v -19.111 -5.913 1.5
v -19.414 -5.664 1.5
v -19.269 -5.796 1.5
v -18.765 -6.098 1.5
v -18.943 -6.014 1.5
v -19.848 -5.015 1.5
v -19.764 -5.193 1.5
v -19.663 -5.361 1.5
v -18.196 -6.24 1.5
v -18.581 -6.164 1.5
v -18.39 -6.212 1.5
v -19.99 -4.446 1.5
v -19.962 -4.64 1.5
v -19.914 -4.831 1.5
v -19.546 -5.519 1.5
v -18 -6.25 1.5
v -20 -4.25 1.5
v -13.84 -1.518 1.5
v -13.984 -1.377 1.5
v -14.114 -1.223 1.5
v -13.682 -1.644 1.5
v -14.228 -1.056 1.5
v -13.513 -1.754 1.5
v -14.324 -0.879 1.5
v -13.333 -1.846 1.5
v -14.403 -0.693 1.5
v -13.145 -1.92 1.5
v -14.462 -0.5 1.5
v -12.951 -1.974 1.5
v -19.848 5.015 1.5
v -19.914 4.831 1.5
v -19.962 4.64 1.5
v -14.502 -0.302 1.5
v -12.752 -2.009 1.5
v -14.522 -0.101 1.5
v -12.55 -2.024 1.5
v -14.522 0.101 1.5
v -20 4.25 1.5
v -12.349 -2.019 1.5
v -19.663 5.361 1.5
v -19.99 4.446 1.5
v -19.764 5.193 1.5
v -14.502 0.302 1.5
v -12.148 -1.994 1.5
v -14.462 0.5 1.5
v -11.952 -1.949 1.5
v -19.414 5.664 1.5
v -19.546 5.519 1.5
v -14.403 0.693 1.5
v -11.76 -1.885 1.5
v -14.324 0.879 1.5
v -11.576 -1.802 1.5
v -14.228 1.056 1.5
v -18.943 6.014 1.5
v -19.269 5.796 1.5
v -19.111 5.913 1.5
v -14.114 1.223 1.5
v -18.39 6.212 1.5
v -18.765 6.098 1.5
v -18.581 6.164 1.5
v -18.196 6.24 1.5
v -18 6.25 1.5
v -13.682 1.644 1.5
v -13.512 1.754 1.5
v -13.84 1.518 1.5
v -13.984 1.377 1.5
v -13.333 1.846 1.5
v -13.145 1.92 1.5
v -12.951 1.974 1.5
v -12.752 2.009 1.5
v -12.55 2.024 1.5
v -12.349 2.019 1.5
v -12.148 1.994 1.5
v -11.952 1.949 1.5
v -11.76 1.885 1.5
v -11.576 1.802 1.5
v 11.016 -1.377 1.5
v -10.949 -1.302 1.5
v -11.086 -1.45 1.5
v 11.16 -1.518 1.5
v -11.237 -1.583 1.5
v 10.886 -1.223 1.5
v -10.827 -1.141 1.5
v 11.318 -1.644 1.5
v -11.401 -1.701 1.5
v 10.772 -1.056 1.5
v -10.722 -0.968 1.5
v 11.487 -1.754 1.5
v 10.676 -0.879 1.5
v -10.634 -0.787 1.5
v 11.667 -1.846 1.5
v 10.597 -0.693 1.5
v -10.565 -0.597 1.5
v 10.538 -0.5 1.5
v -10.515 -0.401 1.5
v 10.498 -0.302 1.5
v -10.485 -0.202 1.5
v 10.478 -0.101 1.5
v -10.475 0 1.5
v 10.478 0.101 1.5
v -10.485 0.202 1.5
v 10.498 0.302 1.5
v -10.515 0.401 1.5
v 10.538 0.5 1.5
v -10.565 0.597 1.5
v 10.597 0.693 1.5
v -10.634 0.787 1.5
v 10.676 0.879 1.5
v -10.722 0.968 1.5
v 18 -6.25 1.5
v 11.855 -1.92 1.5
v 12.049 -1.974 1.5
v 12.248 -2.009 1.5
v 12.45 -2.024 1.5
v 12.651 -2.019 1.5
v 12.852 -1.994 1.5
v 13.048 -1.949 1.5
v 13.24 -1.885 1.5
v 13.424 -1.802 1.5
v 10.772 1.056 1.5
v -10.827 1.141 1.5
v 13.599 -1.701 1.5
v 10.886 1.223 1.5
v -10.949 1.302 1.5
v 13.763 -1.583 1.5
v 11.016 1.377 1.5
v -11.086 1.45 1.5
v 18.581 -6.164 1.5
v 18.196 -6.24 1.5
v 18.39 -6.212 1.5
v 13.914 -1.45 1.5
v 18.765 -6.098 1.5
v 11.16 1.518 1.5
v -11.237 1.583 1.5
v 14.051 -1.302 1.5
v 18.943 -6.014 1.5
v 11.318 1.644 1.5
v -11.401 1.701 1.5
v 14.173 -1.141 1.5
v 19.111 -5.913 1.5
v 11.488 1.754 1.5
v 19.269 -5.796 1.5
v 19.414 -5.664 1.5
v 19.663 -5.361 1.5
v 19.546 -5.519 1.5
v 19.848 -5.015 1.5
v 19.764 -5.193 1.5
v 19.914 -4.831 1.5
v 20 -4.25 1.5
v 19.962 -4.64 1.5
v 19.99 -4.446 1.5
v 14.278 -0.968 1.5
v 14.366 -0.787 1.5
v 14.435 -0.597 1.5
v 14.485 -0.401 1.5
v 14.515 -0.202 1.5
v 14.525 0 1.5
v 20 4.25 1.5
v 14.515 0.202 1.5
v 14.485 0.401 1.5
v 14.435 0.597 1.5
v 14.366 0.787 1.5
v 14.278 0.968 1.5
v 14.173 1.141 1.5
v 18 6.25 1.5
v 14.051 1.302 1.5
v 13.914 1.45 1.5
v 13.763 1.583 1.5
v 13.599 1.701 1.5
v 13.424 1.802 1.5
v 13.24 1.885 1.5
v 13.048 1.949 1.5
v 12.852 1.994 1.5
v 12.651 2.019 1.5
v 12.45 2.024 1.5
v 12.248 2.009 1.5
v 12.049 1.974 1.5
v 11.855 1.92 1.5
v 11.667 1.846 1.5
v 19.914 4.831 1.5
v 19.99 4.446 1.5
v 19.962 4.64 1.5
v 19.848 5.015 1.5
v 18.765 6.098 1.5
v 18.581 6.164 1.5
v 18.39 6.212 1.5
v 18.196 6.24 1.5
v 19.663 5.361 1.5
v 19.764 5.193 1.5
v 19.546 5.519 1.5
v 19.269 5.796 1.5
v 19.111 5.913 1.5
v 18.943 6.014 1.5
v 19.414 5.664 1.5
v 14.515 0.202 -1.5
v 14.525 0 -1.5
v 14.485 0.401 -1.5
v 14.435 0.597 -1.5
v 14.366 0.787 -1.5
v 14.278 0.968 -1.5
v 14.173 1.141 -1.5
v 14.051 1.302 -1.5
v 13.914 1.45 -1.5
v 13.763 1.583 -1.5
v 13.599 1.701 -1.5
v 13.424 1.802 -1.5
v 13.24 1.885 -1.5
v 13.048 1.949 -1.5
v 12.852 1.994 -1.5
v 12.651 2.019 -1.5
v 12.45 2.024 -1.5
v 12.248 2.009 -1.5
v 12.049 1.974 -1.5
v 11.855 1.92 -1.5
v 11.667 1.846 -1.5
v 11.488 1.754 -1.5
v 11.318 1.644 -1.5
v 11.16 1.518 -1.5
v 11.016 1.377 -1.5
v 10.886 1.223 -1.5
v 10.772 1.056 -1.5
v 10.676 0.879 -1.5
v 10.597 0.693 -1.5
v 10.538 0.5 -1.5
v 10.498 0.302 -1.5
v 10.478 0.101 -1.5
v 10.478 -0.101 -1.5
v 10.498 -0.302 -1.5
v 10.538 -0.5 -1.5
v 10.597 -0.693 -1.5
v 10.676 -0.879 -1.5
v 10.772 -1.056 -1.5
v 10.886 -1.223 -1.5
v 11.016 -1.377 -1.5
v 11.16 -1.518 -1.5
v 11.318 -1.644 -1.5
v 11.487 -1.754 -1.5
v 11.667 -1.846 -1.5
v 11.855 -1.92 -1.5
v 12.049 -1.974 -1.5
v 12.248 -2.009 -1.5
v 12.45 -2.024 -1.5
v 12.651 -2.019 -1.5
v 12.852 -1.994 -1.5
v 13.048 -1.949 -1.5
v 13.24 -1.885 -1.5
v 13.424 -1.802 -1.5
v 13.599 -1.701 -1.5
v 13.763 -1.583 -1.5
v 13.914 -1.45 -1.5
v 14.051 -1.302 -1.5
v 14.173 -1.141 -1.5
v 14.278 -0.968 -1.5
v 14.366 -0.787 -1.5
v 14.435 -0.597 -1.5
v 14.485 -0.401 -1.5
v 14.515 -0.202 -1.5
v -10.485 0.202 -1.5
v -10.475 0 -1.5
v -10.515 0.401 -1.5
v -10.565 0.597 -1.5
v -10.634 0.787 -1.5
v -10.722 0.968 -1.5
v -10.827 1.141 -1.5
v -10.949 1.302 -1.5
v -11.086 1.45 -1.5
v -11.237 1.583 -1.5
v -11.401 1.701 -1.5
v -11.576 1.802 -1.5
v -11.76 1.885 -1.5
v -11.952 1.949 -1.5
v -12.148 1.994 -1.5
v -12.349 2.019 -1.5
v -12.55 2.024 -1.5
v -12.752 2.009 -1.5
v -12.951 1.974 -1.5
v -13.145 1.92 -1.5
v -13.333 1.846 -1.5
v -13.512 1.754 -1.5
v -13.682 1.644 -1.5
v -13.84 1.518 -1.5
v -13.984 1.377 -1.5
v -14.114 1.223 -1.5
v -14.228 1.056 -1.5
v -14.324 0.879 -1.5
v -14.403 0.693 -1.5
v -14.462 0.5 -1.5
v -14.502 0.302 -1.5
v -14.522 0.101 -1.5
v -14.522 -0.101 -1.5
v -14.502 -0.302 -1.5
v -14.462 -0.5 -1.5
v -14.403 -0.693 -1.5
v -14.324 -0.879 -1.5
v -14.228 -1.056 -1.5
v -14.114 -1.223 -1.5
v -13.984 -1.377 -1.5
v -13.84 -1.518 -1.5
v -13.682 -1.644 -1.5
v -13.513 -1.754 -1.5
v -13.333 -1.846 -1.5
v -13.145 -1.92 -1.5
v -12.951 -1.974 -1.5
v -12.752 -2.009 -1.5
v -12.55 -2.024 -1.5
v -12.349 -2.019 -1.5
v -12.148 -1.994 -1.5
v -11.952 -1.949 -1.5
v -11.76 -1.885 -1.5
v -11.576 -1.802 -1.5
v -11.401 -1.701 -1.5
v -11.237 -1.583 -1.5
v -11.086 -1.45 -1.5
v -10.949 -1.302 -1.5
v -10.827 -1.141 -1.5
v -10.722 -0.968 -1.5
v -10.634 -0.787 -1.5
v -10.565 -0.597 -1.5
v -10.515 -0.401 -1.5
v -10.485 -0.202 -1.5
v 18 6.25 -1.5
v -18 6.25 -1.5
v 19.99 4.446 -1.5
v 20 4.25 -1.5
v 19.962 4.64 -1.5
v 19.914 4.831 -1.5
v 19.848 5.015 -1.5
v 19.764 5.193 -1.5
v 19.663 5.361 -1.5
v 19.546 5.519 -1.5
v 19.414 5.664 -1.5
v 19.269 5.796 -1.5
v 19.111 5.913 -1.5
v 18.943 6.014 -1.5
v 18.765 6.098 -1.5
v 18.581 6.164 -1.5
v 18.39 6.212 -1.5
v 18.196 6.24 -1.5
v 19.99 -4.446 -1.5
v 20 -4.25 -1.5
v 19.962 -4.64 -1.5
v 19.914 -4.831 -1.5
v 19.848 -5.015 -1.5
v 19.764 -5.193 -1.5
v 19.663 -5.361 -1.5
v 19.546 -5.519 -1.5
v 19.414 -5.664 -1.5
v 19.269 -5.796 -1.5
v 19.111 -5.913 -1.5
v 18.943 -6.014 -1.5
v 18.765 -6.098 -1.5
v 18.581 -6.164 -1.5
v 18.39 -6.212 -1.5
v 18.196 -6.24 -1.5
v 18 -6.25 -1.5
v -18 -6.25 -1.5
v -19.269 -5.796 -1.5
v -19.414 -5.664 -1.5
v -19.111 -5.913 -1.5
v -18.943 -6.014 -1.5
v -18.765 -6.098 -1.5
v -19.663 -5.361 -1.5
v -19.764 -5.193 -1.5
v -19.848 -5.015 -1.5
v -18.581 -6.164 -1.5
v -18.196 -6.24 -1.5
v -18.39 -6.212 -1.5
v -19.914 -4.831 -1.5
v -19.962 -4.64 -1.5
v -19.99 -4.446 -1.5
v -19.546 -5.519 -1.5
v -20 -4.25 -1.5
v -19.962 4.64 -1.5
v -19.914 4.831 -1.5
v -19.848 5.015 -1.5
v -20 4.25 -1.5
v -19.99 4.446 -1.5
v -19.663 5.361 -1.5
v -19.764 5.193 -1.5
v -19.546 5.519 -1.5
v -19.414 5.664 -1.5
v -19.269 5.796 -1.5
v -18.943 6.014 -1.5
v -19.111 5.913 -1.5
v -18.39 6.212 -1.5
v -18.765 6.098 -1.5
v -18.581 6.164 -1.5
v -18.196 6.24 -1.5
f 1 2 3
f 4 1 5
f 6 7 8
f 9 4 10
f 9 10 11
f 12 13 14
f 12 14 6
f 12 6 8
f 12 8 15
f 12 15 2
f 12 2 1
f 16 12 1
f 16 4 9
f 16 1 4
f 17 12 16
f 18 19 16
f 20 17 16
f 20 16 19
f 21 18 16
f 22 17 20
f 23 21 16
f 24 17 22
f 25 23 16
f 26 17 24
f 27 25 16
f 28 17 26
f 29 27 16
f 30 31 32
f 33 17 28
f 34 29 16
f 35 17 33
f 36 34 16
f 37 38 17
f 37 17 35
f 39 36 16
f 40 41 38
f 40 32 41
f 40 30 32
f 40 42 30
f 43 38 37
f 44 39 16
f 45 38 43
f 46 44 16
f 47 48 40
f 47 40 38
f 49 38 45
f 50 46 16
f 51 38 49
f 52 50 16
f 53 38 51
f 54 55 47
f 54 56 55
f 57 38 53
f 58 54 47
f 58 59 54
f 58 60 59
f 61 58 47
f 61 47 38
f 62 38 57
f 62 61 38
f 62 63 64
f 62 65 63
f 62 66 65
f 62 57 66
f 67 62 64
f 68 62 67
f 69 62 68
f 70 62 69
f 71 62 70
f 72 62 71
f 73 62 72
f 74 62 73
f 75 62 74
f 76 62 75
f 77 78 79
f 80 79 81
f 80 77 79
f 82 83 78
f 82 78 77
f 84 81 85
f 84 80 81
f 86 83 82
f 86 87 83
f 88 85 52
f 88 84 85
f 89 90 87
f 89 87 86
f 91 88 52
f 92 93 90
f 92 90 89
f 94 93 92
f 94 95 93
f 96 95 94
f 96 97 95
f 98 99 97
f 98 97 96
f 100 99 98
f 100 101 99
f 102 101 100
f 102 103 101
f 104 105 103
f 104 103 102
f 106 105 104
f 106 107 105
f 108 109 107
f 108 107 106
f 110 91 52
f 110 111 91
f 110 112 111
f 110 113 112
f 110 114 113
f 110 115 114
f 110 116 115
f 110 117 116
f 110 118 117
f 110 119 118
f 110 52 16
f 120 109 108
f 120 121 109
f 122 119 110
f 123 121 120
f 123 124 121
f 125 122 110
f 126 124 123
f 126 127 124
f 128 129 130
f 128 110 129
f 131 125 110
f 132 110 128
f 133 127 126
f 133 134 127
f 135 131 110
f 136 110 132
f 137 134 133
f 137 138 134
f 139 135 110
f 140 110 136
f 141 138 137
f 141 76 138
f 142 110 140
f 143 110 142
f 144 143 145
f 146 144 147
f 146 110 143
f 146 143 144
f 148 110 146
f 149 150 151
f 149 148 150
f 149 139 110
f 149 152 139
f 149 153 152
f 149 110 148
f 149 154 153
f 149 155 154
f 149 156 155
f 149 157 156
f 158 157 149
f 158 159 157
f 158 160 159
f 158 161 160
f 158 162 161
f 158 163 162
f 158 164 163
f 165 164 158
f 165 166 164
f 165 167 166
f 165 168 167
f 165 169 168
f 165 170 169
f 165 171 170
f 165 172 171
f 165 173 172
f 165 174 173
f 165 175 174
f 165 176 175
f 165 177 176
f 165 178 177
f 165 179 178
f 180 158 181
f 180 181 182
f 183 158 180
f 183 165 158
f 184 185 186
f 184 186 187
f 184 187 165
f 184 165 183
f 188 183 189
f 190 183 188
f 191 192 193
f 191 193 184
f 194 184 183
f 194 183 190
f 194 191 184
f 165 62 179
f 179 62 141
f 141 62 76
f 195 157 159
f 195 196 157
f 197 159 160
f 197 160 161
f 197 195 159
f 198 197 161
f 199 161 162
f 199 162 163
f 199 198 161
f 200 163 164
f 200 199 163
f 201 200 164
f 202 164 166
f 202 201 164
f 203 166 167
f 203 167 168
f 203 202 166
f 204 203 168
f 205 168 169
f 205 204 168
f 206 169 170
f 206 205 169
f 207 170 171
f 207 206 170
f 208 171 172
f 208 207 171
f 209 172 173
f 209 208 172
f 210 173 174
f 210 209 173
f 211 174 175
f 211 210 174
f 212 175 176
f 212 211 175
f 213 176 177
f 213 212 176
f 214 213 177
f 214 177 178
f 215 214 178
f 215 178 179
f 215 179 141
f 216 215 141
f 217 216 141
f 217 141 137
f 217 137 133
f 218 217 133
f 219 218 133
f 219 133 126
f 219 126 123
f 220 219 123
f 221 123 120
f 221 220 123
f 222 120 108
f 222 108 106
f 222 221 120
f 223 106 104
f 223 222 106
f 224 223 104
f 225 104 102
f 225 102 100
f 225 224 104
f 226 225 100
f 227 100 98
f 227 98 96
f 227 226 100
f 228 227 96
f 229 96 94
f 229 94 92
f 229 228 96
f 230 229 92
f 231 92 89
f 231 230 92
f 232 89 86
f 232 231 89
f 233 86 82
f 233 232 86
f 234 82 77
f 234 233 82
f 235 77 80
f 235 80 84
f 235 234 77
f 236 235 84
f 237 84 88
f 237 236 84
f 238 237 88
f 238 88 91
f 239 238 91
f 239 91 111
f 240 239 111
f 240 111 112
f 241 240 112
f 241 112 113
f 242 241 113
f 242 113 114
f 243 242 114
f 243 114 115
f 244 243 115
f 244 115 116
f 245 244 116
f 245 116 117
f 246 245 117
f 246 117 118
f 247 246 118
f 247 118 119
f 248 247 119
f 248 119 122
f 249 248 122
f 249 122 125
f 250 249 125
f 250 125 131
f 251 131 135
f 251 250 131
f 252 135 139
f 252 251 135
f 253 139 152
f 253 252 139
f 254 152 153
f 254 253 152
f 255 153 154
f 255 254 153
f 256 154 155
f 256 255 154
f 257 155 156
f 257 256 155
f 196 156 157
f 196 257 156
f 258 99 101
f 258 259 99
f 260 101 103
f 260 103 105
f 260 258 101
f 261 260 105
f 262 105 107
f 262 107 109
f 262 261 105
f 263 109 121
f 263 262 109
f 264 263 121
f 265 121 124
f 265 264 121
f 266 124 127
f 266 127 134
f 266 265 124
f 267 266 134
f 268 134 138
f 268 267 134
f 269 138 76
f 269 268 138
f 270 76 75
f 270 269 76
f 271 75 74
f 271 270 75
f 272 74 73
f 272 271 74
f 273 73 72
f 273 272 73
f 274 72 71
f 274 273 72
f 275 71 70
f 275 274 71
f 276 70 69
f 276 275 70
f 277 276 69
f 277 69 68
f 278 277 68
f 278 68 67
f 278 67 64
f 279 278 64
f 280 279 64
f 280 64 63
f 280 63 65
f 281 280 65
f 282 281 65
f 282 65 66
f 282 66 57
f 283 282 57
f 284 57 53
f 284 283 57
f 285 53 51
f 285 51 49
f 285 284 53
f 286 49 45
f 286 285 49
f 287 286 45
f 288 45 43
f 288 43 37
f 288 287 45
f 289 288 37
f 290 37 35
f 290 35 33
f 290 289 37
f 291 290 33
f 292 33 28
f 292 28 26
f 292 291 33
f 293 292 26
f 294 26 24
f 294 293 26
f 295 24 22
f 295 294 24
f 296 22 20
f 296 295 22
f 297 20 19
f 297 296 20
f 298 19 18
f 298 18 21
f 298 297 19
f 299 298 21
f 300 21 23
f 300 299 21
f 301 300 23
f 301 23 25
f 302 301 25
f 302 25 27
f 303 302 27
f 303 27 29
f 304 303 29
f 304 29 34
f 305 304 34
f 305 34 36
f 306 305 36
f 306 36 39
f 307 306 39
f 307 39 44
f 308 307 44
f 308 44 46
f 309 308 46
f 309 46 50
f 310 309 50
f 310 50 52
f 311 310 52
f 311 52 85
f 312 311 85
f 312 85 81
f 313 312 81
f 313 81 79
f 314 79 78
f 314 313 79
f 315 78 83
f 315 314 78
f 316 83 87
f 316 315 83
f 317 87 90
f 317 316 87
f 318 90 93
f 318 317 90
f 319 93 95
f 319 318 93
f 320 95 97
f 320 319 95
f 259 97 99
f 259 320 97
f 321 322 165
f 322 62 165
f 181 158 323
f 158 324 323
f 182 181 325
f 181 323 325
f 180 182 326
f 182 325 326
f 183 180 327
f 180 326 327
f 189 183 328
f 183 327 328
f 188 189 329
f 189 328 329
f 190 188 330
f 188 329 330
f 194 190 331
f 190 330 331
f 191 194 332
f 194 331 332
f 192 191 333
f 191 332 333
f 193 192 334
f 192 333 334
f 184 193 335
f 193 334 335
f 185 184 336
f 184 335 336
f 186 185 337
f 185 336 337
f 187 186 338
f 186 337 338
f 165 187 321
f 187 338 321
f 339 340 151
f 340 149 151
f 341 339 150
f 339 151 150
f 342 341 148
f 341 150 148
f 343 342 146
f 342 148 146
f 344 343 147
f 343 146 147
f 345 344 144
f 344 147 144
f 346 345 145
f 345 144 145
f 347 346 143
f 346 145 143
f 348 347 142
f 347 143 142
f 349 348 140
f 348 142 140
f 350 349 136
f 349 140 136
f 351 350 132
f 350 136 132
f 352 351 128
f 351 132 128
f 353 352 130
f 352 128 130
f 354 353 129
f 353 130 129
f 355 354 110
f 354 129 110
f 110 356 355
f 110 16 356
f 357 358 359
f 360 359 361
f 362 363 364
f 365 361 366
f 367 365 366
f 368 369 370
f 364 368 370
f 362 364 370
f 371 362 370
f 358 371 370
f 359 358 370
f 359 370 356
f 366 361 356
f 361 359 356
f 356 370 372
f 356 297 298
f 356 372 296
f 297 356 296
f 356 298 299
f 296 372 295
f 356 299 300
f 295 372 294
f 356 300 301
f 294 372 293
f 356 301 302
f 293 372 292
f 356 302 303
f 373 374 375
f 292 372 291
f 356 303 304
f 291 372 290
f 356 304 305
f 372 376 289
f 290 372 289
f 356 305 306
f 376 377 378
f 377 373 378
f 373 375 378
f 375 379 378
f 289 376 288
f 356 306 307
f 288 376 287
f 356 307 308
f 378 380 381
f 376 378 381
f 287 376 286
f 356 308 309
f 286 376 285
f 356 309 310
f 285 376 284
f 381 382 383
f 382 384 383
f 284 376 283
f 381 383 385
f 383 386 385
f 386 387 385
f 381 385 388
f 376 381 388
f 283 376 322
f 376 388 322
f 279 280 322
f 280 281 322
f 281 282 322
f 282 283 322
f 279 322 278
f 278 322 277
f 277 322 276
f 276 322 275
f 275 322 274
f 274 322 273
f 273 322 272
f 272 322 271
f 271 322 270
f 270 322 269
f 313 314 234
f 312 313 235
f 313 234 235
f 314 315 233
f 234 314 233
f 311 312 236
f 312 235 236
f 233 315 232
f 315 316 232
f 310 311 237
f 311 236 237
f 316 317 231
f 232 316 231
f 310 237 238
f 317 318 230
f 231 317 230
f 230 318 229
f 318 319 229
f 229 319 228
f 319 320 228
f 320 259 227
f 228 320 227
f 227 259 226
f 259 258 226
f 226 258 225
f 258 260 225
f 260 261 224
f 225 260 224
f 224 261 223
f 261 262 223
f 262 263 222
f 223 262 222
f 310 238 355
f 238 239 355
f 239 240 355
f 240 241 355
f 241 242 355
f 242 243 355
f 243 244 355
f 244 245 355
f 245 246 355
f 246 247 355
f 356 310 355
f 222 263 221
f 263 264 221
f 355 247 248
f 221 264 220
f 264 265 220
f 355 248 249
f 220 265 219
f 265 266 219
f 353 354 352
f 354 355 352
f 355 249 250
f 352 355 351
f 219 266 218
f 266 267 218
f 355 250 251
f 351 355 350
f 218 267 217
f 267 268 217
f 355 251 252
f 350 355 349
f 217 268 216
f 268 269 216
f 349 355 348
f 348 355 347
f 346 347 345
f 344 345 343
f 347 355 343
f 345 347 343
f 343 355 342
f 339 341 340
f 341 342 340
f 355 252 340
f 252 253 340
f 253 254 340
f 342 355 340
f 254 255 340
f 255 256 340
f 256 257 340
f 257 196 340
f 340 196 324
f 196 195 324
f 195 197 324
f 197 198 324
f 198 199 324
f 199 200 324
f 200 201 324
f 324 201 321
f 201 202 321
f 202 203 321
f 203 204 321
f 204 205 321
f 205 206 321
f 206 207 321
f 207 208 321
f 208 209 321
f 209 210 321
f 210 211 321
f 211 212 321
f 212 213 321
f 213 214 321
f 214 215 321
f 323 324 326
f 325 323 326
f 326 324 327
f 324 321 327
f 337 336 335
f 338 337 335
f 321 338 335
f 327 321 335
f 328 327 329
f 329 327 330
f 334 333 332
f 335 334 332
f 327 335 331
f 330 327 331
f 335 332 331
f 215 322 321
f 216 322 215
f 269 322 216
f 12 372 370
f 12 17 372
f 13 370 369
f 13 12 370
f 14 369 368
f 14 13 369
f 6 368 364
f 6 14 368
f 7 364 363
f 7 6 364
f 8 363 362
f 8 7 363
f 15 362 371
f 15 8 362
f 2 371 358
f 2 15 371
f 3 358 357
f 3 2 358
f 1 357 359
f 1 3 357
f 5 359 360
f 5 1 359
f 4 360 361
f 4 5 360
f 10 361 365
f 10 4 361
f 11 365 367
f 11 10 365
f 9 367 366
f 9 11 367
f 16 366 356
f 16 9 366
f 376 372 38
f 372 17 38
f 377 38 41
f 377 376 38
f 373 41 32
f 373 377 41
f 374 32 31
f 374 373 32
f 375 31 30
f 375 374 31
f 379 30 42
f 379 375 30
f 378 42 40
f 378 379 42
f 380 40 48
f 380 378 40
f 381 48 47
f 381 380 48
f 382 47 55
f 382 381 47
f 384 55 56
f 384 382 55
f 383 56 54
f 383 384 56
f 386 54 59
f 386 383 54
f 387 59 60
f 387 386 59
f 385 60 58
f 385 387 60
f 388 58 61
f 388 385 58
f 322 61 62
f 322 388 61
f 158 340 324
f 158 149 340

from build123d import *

# Parameters (mm, degrees)
SKETCH_1_W      = 40
SKETCH_1_H      = 12.5
SKETCH_1_R      = 2.025
EXTRUDE_1_DEPTH = 1.5
FILLET_1_R      = 2


with BuildPart() as part:
    # 草图1 → 凸台-拉伸1 (new body, symmetric)
    with BuildSketch(Plane.XY):
        Rectangle(SKETCH_1_W, SKETCH_1_H)
        with Locations((-12.5, 0)):
            Circle(SKETCH_1_R, mode=Mode.SUBTRACT)
        with Locations((12.5, 0)):
            Circle(SKETCH_1_R, mode=Mode.SUBTRACT)
    extrude(amount=EXTRUDE_1_DEPTH, both=True)

    # 圆角1
    fillet_1_edges = [part.edges().sort_by_distance(p)[0] for p in [
        (20, -6.25, 0),
        (-20, -6.25, 0),
        (-20, 6.25, 0),
        (20, 6.25, 0),
    ]]
    fillet(fillet_1_edges, radius=FILLET_1_R)


solid = part.part
